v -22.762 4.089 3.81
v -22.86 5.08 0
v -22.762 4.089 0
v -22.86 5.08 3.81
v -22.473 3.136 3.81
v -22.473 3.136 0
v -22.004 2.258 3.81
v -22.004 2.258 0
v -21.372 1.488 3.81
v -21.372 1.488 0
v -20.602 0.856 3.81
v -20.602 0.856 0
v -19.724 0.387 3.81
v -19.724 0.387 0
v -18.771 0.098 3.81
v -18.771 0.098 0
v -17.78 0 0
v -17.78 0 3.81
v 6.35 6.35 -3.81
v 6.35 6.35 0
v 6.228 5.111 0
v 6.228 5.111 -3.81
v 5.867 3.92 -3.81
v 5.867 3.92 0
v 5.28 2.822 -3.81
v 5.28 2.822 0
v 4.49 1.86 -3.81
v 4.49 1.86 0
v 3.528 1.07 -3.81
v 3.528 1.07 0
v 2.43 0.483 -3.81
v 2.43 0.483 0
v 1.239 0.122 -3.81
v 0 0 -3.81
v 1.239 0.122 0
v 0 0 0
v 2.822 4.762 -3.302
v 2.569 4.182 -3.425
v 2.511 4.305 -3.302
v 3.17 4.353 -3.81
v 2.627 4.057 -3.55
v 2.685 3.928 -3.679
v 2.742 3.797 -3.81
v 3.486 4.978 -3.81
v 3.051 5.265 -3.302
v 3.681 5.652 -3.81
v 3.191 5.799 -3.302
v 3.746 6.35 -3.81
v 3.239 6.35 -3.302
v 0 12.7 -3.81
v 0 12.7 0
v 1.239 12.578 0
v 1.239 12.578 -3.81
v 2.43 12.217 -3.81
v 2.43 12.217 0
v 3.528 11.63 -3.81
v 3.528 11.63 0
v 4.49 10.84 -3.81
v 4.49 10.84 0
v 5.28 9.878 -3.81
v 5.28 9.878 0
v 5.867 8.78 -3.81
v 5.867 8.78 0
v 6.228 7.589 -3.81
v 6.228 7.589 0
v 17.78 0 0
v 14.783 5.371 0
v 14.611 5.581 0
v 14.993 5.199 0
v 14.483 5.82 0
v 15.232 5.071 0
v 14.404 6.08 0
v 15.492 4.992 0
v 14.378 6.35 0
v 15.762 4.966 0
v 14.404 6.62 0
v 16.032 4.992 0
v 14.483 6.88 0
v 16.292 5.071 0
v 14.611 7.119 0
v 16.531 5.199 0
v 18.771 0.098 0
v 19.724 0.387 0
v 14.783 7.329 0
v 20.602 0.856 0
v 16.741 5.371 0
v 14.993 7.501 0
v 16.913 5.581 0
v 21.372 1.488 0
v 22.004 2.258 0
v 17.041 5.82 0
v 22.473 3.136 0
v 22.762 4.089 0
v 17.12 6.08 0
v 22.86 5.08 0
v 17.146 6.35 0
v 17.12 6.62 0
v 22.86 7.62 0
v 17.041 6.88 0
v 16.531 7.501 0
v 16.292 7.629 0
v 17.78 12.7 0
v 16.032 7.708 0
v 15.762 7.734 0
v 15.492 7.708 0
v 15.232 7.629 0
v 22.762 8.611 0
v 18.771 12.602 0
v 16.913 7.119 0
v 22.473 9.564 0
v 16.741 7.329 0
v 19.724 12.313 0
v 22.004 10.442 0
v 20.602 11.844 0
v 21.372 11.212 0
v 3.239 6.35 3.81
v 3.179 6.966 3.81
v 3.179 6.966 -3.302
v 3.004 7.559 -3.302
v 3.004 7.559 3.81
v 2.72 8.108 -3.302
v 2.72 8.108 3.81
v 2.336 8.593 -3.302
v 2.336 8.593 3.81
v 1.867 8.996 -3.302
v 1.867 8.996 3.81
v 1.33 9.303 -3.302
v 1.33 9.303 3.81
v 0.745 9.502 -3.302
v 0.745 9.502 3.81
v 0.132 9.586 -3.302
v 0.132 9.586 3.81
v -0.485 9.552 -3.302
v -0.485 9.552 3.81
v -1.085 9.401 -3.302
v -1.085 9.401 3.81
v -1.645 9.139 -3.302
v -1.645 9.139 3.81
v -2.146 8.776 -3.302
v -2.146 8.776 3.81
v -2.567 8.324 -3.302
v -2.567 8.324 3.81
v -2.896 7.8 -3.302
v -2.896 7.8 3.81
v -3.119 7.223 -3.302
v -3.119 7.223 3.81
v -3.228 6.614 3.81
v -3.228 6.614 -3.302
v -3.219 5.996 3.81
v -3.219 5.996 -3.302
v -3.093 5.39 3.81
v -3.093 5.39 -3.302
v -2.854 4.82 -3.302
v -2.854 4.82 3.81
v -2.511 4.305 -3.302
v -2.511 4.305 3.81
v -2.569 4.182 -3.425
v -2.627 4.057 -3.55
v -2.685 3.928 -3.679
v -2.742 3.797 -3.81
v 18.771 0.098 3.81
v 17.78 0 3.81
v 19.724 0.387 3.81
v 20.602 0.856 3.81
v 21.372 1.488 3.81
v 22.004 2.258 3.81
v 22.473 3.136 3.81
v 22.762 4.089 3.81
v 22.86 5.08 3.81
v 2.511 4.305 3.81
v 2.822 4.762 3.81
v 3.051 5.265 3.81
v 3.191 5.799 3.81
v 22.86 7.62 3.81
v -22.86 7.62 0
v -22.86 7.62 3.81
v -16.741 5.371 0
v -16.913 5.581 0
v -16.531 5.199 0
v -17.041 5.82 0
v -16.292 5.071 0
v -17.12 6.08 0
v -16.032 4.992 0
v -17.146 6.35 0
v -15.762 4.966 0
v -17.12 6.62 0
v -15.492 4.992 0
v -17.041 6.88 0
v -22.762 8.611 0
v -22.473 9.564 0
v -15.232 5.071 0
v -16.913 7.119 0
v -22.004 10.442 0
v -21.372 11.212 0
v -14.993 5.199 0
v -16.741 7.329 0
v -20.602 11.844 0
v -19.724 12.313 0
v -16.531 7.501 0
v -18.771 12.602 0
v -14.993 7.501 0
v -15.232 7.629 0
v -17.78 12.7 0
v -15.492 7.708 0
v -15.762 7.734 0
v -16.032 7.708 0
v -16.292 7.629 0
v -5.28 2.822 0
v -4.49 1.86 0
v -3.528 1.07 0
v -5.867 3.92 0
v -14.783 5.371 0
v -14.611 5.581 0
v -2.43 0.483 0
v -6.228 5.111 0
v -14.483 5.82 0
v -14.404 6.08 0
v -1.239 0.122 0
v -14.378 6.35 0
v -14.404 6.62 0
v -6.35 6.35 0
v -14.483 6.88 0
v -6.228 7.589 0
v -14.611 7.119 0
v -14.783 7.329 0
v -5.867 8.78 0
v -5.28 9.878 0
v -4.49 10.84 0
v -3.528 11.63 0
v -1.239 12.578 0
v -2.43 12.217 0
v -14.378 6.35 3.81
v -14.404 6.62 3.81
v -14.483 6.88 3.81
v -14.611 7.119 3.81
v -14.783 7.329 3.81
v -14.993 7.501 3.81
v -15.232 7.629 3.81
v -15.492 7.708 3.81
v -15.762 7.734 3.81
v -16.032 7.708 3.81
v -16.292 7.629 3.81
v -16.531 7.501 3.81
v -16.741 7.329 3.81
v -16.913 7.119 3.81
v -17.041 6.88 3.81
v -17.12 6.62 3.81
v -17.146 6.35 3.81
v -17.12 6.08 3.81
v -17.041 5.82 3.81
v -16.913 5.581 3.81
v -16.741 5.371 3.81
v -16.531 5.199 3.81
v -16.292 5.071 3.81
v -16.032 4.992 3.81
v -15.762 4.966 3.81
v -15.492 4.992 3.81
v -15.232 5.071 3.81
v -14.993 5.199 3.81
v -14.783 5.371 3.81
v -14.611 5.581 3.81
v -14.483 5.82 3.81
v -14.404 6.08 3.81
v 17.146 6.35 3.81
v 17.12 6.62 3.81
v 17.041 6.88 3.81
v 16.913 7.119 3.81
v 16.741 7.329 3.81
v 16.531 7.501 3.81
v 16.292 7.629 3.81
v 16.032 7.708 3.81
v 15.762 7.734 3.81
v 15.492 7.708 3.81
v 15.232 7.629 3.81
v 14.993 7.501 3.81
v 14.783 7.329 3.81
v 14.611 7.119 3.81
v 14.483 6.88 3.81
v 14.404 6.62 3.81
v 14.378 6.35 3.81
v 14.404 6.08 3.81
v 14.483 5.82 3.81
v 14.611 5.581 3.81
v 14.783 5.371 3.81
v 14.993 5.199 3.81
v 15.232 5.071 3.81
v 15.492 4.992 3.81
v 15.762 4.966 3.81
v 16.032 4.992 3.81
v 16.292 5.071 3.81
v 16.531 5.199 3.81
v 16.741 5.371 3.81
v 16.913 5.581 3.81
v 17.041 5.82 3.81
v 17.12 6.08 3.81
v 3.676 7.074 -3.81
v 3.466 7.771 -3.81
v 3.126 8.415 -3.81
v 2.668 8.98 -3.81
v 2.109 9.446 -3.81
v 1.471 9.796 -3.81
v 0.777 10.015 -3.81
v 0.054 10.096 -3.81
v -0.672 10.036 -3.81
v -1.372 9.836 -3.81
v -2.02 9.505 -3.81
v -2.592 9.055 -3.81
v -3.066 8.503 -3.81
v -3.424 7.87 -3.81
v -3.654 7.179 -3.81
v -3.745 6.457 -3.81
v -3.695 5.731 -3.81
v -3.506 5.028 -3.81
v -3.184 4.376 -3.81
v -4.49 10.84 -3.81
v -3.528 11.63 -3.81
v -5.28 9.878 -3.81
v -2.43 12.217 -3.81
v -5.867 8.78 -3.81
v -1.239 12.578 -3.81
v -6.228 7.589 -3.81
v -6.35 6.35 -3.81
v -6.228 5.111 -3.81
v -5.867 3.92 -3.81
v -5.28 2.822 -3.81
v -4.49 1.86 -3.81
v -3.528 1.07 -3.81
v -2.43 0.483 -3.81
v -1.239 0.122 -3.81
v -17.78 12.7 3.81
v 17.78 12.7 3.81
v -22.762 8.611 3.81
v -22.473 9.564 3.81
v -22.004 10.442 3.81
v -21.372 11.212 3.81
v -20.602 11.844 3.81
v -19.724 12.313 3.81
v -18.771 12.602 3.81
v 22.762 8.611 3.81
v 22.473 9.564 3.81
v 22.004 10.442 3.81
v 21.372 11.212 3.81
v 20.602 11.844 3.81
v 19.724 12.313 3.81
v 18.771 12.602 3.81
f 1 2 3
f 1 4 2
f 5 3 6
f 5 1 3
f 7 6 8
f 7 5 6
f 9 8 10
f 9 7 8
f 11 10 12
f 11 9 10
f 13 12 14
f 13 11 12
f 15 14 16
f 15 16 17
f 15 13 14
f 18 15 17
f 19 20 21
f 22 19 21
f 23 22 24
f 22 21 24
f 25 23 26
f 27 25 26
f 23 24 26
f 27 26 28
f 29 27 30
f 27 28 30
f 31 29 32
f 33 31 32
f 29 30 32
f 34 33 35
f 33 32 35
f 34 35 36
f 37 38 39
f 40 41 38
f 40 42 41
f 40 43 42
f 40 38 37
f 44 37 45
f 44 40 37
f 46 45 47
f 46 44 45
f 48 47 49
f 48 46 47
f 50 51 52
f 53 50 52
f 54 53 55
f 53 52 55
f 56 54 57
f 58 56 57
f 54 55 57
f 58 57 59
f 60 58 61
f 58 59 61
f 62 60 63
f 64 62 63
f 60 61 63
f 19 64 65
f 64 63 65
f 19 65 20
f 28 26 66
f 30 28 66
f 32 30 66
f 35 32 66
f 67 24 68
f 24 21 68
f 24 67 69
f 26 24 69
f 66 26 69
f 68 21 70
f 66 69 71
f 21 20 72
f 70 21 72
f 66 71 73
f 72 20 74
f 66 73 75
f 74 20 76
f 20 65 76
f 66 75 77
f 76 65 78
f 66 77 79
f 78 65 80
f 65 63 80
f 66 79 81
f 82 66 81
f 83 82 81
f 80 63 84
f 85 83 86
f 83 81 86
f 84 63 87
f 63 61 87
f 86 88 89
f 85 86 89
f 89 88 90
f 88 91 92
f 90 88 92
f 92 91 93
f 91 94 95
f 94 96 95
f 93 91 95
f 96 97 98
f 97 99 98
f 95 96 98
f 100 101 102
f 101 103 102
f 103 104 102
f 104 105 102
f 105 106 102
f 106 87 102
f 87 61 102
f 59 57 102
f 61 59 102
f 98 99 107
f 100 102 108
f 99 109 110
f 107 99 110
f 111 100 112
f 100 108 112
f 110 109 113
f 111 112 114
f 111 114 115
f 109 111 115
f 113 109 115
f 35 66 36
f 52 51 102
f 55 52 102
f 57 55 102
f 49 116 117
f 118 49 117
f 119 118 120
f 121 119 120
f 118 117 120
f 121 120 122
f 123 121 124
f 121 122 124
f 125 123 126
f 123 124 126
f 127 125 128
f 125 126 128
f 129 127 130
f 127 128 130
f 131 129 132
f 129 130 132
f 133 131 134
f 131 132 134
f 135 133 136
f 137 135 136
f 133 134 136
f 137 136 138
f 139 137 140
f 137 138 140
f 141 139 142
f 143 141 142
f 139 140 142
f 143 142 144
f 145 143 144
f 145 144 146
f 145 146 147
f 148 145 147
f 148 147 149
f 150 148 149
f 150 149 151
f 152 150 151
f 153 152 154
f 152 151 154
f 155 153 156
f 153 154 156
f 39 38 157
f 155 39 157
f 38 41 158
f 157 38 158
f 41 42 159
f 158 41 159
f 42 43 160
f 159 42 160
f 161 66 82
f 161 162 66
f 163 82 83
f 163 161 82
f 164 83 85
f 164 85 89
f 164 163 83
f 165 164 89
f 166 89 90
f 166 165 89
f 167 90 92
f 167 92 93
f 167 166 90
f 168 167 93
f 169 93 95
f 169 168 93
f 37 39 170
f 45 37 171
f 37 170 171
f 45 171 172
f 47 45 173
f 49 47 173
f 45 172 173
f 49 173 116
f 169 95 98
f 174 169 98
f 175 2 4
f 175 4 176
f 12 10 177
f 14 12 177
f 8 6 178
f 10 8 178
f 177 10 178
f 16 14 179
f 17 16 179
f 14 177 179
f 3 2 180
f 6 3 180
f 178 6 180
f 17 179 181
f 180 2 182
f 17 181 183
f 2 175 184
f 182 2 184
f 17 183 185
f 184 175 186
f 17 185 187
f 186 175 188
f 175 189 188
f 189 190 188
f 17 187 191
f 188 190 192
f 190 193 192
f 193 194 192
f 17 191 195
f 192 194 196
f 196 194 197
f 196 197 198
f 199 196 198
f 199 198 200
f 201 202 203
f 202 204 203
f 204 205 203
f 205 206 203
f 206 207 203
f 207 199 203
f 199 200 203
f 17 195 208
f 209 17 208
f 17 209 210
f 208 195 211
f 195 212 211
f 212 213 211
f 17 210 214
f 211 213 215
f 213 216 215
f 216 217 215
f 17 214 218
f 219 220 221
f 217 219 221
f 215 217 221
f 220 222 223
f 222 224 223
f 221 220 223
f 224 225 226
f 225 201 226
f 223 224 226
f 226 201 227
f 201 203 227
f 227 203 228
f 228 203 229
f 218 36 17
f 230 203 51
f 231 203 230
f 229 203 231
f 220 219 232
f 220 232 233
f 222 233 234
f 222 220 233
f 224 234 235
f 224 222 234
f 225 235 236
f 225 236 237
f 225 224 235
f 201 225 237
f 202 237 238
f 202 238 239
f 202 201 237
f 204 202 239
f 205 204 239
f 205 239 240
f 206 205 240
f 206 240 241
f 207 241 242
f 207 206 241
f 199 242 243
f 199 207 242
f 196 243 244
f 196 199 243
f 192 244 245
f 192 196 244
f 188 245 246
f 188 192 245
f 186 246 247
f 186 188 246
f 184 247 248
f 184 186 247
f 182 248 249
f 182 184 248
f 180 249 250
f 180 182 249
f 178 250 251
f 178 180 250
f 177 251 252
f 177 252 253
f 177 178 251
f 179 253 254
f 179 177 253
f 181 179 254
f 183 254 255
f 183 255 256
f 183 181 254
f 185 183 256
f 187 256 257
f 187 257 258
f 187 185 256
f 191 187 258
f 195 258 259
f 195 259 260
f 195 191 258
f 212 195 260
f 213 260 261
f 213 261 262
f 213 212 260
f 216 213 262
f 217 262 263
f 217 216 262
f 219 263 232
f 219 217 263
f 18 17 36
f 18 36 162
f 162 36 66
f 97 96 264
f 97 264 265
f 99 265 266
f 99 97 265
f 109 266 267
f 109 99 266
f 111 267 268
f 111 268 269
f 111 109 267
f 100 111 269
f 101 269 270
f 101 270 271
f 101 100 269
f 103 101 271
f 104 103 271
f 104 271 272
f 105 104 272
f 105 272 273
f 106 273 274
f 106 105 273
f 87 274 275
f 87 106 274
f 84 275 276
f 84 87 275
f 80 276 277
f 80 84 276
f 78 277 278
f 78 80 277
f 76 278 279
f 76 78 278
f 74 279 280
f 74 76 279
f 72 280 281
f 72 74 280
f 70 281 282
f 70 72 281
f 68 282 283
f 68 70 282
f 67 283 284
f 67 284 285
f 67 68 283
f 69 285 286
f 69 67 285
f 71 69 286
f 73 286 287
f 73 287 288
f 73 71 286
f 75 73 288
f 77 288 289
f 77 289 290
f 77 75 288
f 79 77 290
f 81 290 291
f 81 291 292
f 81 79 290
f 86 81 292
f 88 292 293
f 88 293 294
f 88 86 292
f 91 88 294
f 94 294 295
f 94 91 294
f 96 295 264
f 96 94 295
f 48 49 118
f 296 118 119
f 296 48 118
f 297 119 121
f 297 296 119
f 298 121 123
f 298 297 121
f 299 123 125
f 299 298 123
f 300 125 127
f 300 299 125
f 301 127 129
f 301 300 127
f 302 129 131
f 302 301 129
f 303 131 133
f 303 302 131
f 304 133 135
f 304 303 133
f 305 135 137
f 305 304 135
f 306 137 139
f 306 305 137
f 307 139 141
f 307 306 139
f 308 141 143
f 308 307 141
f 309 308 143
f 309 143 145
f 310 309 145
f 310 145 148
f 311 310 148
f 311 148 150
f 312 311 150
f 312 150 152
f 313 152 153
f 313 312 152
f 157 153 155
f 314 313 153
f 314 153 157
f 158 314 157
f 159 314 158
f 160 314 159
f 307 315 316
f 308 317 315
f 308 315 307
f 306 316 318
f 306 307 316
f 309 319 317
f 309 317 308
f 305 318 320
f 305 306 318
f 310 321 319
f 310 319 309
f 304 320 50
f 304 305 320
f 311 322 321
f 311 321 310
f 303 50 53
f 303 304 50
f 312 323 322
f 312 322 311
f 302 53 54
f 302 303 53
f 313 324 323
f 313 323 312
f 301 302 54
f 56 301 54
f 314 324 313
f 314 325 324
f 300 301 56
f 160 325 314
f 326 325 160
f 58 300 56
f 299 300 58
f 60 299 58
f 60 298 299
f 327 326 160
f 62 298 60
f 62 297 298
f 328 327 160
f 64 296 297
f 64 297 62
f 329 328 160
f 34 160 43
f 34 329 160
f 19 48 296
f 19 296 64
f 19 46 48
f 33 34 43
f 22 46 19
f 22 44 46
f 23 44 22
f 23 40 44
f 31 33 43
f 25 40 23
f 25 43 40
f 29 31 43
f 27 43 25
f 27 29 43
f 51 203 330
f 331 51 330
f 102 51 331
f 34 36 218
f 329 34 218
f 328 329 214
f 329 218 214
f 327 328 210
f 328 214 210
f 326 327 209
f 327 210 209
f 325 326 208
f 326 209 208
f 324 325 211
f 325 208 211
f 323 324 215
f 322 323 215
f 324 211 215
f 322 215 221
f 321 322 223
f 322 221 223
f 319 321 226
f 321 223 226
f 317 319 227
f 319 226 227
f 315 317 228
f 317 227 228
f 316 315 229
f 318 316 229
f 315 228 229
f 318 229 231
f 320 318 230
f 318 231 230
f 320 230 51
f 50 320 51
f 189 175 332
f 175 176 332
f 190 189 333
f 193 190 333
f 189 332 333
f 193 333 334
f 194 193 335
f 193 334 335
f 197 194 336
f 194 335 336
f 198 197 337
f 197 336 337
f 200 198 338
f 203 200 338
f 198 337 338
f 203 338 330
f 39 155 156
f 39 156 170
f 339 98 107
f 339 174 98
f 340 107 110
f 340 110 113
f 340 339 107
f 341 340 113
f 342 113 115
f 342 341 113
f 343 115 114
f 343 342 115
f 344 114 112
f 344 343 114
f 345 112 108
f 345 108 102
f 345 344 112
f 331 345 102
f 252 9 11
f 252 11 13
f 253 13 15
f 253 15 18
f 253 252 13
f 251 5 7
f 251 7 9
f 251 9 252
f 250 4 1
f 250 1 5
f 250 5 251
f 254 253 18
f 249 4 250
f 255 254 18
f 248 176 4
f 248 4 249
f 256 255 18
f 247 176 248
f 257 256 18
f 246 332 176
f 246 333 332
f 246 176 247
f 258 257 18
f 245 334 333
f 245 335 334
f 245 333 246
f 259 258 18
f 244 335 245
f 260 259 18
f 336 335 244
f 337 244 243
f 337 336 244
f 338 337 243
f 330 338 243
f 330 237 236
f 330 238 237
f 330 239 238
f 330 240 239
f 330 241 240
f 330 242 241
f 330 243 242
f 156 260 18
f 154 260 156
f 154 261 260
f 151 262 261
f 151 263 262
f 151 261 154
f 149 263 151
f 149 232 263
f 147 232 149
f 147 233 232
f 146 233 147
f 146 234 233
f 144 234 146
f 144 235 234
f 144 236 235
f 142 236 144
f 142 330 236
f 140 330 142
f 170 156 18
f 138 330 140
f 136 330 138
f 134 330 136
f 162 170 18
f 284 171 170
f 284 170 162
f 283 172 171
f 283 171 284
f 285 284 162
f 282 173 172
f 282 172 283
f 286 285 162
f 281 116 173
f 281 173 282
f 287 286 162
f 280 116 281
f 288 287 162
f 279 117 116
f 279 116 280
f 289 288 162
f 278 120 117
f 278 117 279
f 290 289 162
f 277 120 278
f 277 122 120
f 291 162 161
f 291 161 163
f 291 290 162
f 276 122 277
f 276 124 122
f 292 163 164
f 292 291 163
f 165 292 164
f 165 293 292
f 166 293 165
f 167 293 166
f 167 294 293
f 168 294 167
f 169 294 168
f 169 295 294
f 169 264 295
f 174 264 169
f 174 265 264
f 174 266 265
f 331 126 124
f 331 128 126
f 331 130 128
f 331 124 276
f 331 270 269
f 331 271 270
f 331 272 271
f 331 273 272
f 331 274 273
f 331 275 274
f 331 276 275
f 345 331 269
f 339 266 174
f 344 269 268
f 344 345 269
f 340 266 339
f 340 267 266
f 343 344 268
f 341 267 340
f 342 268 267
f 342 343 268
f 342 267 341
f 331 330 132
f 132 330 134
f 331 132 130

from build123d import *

# Parameters (mm, degrees)
F0_W     = 45.72
F0_H     = 12.7
F0_R     = 1.3843
F1_DEPTH = 3.81
F2_R     = 5.08
F4_DEPTH = 3.81
F5_DEPTH = 12.7
F6_SIZE  = 0.508


with BuildPart() as f1:
    # F0 (on Top) → F1 (new body)
    with BuildSketch(Plane.XY):
        with Locations((0, 6.35)):
            Rectangle(F0_W, F0_H)
        with Locations((-15.76197, 6.35)):
            Circle(F0_R, mode=Mode.SUBTRACT)
        with BuildLine():
            ThreePointArc((-2.511391, 4.3053), (-1.085067, 9.401313), (3.2385, 6.35))
            ThreePointArc((3.2385, 6.35), (3.051313, 5.264933), (2.511391, 4.3053))
            ThreePointArc((2.511391, 4.3053), (0, 3.1115), (-2.511391, 4.3053))
        make_face(mode=Mode.SUBTRACT)
        with Locations((15.76197, 6.35)):
            Circle(F0_R, mode=Mode.SUBTRACT)
        with BuildLine():
            Line((2.511391, 4.3053), (-2.511391, 4.3053))
            ThreePointArc((-2.511391, 4.3053), (0, 3.1115), (2.511391, 4.3053))
        make_face()
        with BuildLine():
            ThreePointArc((2.511391, 4.3053), (3.051313, 5.264933), (3.2385, 6.35))
            ThreePointArc((3.2385, 6.35), (-1.085067, 9.401313), (-2.511391, 4.3053))
            Line((-2.511391, 4.3053), (2.511391, 4.3053))
        make_face()
    extrude(amount=F1_DEPTH)

    # F2
    f2_edges = [f1.edges().sort_by_distance(p)[0] for p in [
        (-22.86, 12.7, 1.905),
        (-22.86, 0, 1.905),
        (22.86, 12.7, 1.905),
        (22.86, 0, 1.905),
    ]]
    fillet(f2_edges, radius=F2_R)

    # F3 (on face) → F4 (join)
    with BuildSketch(Plane(origin=(0, 0, 0), x_dir=(1, 0, 0), z_dir=(0, 0, -1))):
        with BuildLine():
            ThreePointArc((0, -12.7), (4.490128, -10.840128), (6.35, -6.35))
            ThreePointArc((6.35, -6.35), (4.490128, -1.859872), (0, 0))
            ThreePointArc((0, 0), (-6.35, -6.35), (0, -12.7))
        make_face()
    extrude(amount=F4_DEPTH)

    # F0 (on Top) → F5 (cut, symmetric)
    with BuildSketch(Plane.XY):
        with BuildLine():
            ThreePointArc((2.511391, 4.3053), (3.051313, 5.264933), (3.2385, 6.35))
            ThreePointArc((3.2385, 6.35), (-1.085067, 9.401313), (-2.511391, 4.3053))
            Line((-2.511391, 4.3053), (2.511391, 4.3053))
        make_face()
    extrude(amount=F5_DEPTH, both=True, mode=Mode.SUBTRACT)

    # F6
    f6_edges = [f1.edges().sort_by_distance(p)[0] for p in [
        (0, 4.3053, -3.81),
        (0, 9.5885, -3.81),
    ]]
    chamfer(f6_edges, length=F6_SIZE)


solid = f1.part
